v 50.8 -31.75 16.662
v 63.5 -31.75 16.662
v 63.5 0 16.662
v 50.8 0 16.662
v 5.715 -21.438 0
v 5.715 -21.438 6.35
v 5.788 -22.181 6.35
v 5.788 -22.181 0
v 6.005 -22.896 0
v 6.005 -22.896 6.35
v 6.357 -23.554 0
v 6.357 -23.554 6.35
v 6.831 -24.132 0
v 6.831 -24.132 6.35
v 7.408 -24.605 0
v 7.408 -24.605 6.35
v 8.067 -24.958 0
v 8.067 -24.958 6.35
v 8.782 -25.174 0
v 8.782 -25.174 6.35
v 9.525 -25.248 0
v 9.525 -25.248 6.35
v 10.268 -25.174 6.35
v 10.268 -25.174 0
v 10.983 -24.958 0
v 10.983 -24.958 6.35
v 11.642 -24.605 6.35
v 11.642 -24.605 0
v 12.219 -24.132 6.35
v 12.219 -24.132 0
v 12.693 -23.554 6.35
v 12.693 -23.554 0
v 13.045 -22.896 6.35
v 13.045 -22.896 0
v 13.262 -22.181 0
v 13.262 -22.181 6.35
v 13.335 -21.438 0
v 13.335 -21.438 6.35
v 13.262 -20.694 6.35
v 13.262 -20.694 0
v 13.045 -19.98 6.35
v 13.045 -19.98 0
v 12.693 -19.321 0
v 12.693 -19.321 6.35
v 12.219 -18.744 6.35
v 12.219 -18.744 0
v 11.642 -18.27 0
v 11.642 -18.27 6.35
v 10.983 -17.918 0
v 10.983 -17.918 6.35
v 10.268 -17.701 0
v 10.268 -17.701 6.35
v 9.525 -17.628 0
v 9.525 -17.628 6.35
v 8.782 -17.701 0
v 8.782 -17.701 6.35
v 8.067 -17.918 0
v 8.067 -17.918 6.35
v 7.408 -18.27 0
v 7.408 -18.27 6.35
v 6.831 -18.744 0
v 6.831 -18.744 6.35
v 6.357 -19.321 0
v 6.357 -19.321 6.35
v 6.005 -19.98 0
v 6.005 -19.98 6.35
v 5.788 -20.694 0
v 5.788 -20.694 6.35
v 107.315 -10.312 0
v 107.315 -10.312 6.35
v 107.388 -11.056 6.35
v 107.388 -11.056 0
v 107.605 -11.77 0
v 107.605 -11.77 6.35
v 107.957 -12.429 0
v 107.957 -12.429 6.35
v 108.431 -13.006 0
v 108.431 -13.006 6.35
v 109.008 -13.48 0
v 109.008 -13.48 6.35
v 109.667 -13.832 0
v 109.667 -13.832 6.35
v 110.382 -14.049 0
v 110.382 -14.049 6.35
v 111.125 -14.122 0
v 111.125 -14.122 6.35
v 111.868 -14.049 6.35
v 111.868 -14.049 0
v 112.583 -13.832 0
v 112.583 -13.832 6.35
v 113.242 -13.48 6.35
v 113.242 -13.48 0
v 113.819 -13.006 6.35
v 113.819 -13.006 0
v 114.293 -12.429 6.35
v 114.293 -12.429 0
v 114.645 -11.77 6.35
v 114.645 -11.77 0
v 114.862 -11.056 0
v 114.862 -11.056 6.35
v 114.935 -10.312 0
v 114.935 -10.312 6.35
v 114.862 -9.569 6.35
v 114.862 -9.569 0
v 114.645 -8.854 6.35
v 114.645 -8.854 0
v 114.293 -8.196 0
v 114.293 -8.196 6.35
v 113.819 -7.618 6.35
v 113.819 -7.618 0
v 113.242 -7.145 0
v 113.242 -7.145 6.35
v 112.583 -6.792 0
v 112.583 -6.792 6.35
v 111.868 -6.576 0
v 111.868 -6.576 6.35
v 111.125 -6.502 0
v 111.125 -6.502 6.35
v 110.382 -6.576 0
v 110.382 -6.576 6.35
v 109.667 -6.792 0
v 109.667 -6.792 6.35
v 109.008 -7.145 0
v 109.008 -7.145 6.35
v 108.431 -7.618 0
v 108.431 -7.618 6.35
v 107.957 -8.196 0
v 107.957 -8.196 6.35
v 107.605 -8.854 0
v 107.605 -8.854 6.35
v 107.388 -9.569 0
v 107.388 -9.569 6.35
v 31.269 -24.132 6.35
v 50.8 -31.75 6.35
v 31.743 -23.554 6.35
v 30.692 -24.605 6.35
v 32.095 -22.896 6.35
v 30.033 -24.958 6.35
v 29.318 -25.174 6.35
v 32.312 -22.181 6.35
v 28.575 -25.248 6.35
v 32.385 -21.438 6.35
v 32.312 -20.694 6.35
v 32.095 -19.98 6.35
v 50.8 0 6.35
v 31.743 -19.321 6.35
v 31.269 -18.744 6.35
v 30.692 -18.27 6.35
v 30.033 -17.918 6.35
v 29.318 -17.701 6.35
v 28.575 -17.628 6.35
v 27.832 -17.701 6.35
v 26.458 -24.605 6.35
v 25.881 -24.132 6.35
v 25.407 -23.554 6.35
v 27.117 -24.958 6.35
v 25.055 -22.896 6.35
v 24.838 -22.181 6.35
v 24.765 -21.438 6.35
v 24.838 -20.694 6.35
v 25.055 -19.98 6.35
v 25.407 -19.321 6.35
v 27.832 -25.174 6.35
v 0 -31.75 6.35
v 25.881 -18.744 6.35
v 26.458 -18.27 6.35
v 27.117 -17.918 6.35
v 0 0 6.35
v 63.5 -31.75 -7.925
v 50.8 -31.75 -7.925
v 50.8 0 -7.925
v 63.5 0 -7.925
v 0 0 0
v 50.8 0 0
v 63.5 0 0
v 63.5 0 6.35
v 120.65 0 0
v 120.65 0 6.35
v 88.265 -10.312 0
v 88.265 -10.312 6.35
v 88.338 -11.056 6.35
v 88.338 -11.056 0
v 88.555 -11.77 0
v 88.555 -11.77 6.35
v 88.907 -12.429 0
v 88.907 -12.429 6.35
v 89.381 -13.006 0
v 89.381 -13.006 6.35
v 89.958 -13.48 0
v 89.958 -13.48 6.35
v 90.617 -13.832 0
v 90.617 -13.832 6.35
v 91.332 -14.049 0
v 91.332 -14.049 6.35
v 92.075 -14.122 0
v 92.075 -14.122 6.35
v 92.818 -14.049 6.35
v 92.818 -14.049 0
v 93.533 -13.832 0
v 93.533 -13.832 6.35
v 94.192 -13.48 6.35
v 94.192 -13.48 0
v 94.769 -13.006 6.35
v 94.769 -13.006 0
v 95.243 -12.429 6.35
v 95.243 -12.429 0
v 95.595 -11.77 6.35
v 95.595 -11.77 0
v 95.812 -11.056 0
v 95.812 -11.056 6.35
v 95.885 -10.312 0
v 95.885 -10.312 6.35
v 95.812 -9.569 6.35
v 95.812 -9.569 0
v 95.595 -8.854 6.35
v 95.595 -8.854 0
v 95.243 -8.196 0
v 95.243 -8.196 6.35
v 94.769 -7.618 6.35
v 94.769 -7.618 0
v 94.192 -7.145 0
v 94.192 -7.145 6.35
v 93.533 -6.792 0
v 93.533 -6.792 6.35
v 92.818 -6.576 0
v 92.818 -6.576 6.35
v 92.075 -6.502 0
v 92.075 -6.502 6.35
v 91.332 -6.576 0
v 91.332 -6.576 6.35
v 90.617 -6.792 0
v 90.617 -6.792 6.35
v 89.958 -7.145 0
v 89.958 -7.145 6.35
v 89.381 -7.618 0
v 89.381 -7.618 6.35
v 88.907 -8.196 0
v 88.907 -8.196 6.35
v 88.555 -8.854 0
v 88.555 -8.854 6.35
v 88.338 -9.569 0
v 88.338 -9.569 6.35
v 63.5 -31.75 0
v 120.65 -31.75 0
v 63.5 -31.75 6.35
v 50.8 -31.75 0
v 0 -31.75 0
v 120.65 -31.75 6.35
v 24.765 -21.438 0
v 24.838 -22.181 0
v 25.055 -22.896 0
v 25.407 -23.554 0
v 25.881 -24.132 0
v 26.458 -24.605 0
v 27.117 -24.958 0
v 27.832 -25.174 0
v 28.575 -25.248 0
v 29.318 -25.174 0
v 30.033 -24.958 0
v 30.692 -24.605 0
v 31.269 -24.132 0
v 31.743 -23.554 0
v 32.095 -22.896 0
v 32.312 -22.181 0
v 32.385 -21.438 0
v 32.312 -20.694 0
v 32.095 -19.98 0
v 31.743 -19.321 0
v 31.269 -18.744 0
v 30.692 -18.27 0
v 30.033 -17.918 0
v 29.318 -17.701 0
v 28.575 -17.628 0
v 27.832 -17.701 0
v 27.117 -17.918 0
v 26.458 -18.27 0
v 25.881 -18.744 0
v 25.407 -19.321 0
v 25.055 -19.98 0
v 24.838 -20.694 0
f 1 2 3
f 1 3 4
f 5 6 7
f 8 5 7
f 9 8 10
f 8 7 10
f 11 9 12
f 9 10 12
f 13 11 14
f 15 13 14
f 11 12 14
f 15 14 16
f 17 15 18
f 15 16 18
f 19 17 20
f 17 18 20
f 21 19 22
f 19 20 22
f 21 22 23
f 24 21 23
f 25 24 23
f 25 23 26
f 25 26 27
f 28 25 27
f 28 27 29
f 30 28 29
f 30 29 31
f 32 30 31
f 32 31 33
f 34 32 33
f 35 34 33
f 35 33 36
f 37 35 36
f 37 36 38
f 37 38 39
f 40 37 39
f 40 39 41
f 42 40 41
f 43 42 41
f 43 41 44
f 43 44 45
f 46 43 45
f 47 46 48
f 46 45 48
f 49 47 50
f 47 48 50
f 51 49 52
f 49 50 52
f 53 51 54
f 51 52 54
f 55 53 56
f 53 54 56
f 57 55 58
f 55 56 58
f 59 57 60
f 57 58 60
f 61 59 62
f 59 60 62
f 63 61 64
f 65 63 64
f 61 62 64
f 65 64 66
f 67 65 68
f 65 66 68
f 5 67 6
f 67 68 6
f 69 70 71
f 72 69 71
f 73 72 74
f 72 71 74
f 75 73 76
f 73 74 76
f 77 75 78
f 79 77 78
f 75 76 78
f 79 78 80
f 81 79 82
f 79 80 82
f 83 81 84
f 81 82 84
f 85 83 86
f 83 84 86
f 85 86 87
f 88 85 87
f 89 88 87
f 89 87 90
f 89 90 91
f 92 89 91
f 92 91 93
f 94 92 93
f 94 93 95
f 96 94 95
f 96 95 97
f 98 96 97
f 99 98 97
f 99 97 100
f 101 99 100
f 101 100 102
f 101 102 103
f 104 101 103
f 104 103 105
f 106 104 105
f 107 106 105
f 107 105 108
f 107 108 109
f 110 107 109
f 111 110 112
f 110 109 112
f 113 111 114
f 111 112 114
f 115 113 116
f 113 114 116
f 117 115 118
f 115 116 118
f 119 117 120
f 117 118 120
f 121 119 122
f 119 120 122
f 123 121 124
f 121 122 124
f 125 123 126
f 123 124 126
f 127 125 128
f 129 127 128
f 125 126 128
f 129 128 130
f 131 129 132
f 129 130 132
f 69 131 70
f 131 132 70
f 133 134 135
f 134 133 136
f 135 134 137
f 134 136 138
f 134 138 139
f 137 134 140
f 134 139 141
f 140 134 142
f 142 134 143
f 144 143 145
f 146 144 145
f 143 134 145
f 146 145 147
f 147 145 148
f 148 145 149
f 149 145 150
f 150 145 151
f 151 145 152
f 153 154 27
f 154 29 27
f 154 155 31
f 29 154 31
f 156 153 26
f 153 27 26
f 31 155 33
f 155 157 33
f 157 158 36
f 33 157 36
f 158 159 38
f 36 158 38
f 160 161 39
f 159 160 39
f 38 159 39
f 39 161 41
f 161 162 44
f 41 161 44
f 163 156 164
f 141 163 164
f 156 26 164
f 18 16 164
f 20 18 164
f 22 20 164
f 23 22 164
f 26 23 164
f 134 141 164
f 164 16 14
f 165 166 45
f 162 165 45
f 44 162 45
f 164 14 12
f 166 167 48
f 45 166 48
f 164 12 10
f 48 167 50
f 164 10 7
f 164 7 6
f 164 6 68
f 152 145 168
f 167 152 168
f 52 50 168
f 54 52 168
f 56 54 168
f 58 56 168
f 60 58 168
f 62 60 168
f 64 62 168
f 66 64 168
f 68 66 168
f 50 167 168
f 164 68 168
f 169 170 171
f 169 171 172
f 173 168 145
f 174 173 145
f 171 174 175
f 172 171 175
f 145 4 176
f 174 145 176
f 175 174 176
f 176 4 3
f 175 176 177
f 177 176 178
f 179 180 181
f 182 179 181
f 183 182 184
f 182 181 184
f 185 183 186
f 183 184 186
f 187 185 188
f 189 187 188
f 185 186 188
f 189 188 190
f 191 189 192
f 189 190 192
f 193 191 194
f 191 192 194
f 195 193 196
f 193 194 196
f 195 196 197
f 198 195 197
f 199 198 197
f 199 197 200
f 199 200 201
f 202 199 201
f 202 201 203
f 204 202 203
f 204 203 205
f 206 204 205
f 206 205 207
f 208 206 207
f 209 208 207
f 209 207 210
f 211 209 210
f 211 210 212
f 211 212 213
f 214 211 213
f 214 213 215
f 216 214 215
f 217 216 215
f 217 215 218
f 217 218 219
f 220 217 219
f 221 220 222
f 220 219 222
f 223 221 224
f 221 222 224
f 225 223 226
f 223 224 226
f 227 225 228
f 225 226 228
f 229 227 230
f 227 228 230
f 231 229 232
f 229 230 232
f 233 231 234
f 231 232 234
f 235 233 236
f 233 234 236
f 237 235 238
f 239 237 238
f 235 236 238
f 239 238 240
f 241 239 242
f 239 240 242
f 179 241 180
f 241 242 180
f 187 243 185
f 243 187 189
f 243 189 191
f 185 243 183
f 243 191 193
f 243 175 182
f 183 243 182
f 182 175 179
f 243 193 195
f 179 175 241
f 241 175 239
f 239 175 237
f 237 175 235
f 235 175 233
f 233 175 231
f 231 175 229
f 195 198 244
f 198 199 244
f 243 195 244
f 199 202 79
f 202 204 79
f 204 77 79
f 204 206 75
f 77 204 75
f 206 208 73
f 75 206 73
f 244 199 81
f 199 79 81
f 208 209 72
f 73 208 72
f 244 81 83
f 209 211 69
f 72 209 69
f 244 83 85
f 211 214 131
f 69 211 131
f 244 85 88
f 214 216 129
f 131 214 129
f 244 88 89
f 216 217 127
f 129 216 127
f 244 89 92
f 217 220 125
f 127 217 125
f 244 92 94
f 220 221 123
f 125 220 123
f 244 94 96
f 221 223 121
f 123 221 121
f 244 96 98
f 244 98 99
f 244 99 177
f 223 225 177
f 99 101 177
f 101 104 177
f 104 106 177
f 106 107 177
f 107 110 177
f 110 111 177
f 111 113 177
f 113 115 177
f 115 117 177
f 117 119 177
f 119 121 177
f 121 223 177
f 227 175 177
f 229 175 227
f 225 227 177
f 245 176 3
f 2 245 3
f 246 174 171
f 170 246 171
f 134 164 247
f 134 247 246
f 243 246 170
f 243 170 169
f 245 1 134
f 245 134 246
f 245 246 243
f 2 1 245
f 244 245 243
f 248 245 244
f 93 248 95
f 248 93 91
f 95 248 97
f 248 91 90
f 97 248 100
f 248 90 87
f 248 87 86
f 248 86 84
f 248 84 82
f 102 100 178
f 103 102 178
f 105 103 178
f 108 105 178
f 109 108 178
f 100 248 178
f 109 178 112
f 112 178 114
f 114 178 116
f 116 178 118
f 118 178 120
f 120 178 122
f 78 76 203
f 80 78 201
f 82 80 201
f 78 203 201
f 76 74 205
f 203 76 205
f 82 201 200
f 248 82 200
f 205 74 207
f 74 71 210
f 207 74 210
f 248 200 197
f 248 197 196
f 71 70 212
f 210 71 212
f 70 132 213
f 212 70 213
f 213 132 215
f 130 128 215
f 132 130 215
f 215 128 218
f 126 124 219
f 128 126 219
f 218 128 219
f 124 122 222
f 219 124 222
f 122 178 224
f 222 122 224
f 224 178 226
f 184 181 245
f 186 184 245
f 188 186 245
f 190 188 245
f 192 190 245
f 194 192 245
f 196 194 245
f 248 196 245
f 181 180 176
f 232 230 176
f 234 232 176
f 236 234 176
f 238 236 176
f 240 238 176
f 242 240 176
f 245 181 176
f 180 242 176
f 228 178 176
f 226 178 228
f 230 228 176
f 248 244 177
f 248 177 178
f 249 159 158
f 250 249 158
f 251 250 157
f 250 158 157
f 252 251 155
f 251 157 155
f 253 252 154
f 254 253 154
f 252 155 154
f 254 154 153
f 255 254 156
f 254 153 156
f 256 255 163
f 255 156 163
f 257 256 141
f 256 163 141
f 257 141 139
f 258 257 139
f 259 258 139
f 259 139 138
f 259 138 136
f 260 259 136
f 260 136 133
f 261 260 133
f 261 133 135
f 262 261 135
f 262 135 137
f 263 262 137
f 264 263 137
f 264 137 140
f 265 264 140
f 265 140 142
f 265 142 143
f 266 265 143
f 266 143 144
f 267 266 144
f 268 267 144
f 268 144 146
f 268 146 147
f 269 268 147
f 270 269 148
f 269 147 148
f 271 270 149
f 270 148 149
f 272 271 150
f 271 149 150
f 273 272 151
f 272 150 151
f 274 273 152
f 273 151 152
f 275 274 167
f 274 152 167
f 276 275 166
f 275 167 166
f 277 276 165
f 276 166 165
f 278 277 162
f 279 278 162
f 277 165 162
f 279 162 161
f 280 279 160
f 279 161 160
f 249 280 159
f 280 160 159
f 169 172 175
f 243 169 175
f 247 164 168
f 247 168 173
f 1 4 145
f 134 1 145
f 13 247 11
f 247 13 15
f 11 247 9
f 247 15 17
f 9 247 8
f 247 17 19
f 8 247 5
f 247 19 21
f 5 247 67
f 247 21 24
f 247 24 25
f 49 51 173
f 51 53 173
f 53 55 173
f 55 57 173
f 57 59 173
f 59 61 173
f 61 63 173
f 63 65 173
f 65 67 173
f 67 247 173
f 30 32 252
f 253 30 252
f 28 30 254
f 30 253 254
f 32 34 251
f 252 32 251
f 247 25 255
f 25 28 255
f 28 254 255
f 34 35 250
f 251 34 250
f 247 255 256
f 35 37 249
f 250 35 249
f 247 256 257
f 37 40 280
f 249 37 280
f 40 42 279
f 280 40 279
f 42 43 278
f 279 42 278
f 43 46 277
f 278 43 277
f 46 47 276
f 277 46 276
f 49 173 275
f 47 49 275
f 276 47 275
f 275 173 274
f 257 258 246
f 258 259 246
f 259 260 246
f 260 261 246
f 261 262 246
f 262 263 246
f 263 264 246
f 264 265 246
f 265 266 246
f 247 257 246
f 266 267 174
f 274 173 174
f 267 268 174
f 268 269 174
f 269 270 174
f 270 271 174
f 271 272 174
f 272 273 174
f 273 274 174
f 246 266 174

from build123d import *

# Parameters (mm, degrees)
F1_DEPTH = 31.75
F3_D     = 7.62


with BuildPart() as f1:
    # F0 (on Front) → F1 (new body)
    with BuildSketch(Plane.XZ):
        Polygon((0, 6.35), (0, 0), (50.8, 0), (50.8, -7.9248), (63.5, -7.9248), (63.5, 0), (120.65, 0), (120.65, 6.35), (63.5, 6.35), (63.5, 16.6624), (50.8, 16.6624), (50.8, 6.35), align=None)
    extrude(amount=F1_DEPTH)

    # F3 (through all)
    with Locations(Plane(origin=(0, 0, 0), x_dir=(1, 0, 0), z_dir=(0, 0, -1))):
        with Locations((9.525, 21.4376), (28.575, 21.4376), (92.075, 10.3124), (111.125, 10.3124)):
            Hole(F3_D / 2)


solid = f1.part
